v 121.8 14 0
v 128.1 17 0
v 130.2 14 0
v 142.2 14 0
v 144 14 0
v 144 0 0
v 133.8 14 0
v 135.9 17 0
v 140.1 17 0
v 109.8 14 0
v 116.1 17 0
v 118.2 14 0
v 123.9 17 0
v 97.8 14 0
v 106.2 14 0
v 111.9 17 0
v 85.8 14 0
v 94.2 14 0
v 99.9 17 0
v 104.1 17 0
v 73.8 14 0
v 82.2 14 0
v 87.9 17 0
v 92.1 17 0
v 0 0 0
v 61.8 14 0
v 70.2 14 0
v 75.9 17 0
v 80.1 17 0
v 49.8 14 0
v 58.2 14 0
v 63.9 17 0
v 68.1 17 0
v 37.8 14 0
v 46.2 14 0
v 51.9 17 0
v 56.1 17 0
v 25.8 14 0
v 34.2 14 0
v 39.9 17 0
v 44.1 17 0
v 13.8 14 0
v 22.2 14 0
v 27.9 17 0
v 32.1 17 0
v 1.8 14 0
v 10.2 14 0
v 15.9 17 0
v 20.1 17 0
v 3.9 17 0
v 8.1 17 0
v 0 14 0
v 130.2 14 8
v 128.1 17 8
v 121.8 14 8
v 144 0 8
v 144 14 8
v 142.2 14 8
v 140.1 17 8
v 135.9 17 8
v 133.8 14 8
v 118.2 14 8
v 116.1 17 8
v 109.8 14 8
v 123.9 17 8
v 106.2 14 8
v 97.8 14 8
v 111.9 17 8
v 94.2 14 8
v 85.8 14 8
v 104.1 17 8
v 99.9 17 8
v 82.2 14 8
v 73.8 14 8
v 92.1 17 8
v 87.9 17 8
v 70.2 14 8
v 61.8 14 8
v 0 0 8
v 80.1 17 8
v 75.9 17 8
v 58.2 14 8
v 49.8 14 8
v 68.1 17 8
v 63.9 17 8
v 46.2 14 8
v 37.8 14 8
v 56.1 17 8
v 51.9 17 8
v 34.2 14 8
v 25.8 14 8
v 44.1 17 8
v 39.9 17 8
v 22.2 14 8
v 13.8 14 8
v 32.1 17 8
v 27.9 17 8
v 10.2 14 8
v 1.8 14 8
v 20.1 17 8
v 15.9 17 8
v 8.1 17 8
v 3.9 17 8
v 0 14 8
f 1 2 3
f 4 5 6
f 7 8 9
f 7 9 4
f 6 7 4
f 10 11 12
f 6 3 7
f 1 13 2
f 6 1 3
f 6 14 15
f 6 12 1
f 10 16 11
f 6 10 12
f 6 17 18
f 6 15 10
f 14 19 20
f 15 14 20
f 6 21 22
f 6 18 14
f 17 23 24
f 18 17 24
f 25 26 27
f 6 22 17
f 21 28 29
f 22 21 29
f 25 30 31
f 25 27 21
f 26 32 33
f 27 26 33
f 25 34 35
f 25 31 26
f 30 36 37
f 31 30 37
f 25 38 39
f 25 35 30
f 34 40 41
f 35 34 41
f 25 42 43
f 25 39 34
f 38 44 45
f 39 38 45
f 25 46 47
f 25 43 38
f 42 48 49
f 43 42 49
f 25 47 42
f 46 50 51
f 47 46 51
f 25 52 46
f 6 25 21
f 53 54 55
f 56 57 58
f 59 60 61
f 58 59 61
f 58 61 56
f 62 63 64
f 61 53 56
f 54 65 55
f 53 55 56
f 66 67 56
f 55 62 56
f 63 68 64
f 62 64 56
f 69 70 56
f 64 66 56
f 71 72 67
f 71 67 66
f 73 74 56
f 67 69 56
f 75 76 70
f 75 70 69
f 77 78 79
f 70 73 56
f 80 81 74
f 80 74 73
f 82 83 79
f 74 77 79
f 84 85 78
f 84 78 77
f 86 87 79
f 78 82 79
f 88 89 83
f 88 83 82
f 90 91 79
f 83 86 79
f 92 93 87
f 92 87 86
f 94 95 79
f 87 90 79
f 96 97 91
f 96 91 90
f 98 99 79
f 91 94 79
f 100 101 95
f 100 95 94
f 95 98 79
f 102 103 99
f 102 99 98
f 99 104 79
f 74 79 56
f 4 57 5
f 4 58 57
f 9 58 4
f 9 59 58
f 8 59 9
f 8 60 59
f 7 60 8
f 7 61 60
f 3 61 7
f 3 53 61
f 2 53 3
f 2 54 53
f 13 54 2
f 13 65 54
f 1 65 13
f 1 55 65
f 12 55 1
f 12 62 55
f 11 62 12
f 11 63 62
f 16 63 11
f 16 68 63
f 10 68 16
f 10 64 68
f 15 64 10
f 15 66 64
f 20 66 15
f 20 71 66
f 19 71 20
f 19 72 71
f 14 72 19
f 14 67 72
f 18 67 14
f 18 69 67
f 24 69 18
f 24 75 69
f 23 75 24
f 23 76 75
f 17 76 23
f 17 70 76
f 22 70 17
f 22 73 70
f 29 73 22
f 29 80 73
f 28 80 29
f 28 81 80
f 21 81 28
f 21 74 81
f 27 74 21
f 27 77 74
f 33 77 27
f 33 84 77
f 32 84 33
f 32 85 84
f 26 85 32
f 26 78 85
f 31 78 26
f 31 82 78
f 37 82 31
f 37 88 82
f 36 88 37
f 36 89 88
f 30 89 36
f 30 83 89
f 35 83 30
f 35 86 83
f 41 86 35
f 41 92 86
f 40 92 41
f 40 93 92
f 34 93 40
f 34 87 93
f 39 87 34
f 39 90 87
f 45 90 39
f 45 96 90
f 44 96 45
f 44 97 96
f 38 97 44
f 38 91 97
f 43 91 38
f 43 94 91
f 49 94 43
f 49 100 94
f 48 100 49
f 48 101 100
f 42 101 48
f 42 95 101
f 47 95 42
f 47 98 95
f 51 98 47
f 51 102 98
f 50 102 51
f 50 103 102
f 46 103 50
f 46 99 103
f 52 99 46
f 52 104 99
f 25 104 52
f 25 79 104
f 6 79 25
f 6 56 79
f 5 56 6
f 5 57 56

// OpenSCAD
$fn = 32;

// ----------------------------------------------------------------------
// Gear rack: 12 teeth, pitch 12 mm
// ----------------------------------------------------------------------

// --- parameters (mm) ---
teeth = 12;               // number of teeth
pitch = 12;               // tooth pitch, X
root_w = 8.4;             // tooth width at the root
tip_w = 4.2;              // tooth width at the tip
base_h = 14;              // rack body height, Y
tooth_h = 3;              // tooth height above the body
plate_t = 8;              // rack width, Z (extrusion height)

rack_l = teeth * pitch;  // overall length
total_h = base_h + tooth_h;  // overall height

profile = [[0, 0], [144, 0], [144, 14], [142.2, 14], [140.1, 17], [135.9, 17], [133.8, 14], [130.2, 14], [128.1, 17], [123.9, 17], [121.8, 14], [118.2, 14], [116.1, 17], [111.9, 17], [109.8, 14], [106.2, 14], [104.1, 17], [99.9, 17], [97.8, 14], [94.2, 14], [92.1, 17], [87.9, 17], [85.8, 14], [82.2, 14], [80.1, 17], [75.9, 17], [73.8, 14], [70.2, 14], [68.1, 17], [63.9, 17], [61.8, 14], [58.2, 14], [56.1, 17], [51.9, 17], [49.8, 14], [46.2, 14], [44.1, 17], [39.9, 17], [37.8, 14], [34.2, 14], [32.1, 17], [27.9, 17], [25.8, 14], [22.2, 14], [20.1, 17], [15.9, 17], [13.8, 14], [10.2, 14], [8.1, 17], [3.9, 17], [1.8, 14], [0, 14]];  // primary outline, 52 points, counter clockwise

// --- the one profile operation ---
linear_extrude(height = plate_t) polygon(points = profile);
